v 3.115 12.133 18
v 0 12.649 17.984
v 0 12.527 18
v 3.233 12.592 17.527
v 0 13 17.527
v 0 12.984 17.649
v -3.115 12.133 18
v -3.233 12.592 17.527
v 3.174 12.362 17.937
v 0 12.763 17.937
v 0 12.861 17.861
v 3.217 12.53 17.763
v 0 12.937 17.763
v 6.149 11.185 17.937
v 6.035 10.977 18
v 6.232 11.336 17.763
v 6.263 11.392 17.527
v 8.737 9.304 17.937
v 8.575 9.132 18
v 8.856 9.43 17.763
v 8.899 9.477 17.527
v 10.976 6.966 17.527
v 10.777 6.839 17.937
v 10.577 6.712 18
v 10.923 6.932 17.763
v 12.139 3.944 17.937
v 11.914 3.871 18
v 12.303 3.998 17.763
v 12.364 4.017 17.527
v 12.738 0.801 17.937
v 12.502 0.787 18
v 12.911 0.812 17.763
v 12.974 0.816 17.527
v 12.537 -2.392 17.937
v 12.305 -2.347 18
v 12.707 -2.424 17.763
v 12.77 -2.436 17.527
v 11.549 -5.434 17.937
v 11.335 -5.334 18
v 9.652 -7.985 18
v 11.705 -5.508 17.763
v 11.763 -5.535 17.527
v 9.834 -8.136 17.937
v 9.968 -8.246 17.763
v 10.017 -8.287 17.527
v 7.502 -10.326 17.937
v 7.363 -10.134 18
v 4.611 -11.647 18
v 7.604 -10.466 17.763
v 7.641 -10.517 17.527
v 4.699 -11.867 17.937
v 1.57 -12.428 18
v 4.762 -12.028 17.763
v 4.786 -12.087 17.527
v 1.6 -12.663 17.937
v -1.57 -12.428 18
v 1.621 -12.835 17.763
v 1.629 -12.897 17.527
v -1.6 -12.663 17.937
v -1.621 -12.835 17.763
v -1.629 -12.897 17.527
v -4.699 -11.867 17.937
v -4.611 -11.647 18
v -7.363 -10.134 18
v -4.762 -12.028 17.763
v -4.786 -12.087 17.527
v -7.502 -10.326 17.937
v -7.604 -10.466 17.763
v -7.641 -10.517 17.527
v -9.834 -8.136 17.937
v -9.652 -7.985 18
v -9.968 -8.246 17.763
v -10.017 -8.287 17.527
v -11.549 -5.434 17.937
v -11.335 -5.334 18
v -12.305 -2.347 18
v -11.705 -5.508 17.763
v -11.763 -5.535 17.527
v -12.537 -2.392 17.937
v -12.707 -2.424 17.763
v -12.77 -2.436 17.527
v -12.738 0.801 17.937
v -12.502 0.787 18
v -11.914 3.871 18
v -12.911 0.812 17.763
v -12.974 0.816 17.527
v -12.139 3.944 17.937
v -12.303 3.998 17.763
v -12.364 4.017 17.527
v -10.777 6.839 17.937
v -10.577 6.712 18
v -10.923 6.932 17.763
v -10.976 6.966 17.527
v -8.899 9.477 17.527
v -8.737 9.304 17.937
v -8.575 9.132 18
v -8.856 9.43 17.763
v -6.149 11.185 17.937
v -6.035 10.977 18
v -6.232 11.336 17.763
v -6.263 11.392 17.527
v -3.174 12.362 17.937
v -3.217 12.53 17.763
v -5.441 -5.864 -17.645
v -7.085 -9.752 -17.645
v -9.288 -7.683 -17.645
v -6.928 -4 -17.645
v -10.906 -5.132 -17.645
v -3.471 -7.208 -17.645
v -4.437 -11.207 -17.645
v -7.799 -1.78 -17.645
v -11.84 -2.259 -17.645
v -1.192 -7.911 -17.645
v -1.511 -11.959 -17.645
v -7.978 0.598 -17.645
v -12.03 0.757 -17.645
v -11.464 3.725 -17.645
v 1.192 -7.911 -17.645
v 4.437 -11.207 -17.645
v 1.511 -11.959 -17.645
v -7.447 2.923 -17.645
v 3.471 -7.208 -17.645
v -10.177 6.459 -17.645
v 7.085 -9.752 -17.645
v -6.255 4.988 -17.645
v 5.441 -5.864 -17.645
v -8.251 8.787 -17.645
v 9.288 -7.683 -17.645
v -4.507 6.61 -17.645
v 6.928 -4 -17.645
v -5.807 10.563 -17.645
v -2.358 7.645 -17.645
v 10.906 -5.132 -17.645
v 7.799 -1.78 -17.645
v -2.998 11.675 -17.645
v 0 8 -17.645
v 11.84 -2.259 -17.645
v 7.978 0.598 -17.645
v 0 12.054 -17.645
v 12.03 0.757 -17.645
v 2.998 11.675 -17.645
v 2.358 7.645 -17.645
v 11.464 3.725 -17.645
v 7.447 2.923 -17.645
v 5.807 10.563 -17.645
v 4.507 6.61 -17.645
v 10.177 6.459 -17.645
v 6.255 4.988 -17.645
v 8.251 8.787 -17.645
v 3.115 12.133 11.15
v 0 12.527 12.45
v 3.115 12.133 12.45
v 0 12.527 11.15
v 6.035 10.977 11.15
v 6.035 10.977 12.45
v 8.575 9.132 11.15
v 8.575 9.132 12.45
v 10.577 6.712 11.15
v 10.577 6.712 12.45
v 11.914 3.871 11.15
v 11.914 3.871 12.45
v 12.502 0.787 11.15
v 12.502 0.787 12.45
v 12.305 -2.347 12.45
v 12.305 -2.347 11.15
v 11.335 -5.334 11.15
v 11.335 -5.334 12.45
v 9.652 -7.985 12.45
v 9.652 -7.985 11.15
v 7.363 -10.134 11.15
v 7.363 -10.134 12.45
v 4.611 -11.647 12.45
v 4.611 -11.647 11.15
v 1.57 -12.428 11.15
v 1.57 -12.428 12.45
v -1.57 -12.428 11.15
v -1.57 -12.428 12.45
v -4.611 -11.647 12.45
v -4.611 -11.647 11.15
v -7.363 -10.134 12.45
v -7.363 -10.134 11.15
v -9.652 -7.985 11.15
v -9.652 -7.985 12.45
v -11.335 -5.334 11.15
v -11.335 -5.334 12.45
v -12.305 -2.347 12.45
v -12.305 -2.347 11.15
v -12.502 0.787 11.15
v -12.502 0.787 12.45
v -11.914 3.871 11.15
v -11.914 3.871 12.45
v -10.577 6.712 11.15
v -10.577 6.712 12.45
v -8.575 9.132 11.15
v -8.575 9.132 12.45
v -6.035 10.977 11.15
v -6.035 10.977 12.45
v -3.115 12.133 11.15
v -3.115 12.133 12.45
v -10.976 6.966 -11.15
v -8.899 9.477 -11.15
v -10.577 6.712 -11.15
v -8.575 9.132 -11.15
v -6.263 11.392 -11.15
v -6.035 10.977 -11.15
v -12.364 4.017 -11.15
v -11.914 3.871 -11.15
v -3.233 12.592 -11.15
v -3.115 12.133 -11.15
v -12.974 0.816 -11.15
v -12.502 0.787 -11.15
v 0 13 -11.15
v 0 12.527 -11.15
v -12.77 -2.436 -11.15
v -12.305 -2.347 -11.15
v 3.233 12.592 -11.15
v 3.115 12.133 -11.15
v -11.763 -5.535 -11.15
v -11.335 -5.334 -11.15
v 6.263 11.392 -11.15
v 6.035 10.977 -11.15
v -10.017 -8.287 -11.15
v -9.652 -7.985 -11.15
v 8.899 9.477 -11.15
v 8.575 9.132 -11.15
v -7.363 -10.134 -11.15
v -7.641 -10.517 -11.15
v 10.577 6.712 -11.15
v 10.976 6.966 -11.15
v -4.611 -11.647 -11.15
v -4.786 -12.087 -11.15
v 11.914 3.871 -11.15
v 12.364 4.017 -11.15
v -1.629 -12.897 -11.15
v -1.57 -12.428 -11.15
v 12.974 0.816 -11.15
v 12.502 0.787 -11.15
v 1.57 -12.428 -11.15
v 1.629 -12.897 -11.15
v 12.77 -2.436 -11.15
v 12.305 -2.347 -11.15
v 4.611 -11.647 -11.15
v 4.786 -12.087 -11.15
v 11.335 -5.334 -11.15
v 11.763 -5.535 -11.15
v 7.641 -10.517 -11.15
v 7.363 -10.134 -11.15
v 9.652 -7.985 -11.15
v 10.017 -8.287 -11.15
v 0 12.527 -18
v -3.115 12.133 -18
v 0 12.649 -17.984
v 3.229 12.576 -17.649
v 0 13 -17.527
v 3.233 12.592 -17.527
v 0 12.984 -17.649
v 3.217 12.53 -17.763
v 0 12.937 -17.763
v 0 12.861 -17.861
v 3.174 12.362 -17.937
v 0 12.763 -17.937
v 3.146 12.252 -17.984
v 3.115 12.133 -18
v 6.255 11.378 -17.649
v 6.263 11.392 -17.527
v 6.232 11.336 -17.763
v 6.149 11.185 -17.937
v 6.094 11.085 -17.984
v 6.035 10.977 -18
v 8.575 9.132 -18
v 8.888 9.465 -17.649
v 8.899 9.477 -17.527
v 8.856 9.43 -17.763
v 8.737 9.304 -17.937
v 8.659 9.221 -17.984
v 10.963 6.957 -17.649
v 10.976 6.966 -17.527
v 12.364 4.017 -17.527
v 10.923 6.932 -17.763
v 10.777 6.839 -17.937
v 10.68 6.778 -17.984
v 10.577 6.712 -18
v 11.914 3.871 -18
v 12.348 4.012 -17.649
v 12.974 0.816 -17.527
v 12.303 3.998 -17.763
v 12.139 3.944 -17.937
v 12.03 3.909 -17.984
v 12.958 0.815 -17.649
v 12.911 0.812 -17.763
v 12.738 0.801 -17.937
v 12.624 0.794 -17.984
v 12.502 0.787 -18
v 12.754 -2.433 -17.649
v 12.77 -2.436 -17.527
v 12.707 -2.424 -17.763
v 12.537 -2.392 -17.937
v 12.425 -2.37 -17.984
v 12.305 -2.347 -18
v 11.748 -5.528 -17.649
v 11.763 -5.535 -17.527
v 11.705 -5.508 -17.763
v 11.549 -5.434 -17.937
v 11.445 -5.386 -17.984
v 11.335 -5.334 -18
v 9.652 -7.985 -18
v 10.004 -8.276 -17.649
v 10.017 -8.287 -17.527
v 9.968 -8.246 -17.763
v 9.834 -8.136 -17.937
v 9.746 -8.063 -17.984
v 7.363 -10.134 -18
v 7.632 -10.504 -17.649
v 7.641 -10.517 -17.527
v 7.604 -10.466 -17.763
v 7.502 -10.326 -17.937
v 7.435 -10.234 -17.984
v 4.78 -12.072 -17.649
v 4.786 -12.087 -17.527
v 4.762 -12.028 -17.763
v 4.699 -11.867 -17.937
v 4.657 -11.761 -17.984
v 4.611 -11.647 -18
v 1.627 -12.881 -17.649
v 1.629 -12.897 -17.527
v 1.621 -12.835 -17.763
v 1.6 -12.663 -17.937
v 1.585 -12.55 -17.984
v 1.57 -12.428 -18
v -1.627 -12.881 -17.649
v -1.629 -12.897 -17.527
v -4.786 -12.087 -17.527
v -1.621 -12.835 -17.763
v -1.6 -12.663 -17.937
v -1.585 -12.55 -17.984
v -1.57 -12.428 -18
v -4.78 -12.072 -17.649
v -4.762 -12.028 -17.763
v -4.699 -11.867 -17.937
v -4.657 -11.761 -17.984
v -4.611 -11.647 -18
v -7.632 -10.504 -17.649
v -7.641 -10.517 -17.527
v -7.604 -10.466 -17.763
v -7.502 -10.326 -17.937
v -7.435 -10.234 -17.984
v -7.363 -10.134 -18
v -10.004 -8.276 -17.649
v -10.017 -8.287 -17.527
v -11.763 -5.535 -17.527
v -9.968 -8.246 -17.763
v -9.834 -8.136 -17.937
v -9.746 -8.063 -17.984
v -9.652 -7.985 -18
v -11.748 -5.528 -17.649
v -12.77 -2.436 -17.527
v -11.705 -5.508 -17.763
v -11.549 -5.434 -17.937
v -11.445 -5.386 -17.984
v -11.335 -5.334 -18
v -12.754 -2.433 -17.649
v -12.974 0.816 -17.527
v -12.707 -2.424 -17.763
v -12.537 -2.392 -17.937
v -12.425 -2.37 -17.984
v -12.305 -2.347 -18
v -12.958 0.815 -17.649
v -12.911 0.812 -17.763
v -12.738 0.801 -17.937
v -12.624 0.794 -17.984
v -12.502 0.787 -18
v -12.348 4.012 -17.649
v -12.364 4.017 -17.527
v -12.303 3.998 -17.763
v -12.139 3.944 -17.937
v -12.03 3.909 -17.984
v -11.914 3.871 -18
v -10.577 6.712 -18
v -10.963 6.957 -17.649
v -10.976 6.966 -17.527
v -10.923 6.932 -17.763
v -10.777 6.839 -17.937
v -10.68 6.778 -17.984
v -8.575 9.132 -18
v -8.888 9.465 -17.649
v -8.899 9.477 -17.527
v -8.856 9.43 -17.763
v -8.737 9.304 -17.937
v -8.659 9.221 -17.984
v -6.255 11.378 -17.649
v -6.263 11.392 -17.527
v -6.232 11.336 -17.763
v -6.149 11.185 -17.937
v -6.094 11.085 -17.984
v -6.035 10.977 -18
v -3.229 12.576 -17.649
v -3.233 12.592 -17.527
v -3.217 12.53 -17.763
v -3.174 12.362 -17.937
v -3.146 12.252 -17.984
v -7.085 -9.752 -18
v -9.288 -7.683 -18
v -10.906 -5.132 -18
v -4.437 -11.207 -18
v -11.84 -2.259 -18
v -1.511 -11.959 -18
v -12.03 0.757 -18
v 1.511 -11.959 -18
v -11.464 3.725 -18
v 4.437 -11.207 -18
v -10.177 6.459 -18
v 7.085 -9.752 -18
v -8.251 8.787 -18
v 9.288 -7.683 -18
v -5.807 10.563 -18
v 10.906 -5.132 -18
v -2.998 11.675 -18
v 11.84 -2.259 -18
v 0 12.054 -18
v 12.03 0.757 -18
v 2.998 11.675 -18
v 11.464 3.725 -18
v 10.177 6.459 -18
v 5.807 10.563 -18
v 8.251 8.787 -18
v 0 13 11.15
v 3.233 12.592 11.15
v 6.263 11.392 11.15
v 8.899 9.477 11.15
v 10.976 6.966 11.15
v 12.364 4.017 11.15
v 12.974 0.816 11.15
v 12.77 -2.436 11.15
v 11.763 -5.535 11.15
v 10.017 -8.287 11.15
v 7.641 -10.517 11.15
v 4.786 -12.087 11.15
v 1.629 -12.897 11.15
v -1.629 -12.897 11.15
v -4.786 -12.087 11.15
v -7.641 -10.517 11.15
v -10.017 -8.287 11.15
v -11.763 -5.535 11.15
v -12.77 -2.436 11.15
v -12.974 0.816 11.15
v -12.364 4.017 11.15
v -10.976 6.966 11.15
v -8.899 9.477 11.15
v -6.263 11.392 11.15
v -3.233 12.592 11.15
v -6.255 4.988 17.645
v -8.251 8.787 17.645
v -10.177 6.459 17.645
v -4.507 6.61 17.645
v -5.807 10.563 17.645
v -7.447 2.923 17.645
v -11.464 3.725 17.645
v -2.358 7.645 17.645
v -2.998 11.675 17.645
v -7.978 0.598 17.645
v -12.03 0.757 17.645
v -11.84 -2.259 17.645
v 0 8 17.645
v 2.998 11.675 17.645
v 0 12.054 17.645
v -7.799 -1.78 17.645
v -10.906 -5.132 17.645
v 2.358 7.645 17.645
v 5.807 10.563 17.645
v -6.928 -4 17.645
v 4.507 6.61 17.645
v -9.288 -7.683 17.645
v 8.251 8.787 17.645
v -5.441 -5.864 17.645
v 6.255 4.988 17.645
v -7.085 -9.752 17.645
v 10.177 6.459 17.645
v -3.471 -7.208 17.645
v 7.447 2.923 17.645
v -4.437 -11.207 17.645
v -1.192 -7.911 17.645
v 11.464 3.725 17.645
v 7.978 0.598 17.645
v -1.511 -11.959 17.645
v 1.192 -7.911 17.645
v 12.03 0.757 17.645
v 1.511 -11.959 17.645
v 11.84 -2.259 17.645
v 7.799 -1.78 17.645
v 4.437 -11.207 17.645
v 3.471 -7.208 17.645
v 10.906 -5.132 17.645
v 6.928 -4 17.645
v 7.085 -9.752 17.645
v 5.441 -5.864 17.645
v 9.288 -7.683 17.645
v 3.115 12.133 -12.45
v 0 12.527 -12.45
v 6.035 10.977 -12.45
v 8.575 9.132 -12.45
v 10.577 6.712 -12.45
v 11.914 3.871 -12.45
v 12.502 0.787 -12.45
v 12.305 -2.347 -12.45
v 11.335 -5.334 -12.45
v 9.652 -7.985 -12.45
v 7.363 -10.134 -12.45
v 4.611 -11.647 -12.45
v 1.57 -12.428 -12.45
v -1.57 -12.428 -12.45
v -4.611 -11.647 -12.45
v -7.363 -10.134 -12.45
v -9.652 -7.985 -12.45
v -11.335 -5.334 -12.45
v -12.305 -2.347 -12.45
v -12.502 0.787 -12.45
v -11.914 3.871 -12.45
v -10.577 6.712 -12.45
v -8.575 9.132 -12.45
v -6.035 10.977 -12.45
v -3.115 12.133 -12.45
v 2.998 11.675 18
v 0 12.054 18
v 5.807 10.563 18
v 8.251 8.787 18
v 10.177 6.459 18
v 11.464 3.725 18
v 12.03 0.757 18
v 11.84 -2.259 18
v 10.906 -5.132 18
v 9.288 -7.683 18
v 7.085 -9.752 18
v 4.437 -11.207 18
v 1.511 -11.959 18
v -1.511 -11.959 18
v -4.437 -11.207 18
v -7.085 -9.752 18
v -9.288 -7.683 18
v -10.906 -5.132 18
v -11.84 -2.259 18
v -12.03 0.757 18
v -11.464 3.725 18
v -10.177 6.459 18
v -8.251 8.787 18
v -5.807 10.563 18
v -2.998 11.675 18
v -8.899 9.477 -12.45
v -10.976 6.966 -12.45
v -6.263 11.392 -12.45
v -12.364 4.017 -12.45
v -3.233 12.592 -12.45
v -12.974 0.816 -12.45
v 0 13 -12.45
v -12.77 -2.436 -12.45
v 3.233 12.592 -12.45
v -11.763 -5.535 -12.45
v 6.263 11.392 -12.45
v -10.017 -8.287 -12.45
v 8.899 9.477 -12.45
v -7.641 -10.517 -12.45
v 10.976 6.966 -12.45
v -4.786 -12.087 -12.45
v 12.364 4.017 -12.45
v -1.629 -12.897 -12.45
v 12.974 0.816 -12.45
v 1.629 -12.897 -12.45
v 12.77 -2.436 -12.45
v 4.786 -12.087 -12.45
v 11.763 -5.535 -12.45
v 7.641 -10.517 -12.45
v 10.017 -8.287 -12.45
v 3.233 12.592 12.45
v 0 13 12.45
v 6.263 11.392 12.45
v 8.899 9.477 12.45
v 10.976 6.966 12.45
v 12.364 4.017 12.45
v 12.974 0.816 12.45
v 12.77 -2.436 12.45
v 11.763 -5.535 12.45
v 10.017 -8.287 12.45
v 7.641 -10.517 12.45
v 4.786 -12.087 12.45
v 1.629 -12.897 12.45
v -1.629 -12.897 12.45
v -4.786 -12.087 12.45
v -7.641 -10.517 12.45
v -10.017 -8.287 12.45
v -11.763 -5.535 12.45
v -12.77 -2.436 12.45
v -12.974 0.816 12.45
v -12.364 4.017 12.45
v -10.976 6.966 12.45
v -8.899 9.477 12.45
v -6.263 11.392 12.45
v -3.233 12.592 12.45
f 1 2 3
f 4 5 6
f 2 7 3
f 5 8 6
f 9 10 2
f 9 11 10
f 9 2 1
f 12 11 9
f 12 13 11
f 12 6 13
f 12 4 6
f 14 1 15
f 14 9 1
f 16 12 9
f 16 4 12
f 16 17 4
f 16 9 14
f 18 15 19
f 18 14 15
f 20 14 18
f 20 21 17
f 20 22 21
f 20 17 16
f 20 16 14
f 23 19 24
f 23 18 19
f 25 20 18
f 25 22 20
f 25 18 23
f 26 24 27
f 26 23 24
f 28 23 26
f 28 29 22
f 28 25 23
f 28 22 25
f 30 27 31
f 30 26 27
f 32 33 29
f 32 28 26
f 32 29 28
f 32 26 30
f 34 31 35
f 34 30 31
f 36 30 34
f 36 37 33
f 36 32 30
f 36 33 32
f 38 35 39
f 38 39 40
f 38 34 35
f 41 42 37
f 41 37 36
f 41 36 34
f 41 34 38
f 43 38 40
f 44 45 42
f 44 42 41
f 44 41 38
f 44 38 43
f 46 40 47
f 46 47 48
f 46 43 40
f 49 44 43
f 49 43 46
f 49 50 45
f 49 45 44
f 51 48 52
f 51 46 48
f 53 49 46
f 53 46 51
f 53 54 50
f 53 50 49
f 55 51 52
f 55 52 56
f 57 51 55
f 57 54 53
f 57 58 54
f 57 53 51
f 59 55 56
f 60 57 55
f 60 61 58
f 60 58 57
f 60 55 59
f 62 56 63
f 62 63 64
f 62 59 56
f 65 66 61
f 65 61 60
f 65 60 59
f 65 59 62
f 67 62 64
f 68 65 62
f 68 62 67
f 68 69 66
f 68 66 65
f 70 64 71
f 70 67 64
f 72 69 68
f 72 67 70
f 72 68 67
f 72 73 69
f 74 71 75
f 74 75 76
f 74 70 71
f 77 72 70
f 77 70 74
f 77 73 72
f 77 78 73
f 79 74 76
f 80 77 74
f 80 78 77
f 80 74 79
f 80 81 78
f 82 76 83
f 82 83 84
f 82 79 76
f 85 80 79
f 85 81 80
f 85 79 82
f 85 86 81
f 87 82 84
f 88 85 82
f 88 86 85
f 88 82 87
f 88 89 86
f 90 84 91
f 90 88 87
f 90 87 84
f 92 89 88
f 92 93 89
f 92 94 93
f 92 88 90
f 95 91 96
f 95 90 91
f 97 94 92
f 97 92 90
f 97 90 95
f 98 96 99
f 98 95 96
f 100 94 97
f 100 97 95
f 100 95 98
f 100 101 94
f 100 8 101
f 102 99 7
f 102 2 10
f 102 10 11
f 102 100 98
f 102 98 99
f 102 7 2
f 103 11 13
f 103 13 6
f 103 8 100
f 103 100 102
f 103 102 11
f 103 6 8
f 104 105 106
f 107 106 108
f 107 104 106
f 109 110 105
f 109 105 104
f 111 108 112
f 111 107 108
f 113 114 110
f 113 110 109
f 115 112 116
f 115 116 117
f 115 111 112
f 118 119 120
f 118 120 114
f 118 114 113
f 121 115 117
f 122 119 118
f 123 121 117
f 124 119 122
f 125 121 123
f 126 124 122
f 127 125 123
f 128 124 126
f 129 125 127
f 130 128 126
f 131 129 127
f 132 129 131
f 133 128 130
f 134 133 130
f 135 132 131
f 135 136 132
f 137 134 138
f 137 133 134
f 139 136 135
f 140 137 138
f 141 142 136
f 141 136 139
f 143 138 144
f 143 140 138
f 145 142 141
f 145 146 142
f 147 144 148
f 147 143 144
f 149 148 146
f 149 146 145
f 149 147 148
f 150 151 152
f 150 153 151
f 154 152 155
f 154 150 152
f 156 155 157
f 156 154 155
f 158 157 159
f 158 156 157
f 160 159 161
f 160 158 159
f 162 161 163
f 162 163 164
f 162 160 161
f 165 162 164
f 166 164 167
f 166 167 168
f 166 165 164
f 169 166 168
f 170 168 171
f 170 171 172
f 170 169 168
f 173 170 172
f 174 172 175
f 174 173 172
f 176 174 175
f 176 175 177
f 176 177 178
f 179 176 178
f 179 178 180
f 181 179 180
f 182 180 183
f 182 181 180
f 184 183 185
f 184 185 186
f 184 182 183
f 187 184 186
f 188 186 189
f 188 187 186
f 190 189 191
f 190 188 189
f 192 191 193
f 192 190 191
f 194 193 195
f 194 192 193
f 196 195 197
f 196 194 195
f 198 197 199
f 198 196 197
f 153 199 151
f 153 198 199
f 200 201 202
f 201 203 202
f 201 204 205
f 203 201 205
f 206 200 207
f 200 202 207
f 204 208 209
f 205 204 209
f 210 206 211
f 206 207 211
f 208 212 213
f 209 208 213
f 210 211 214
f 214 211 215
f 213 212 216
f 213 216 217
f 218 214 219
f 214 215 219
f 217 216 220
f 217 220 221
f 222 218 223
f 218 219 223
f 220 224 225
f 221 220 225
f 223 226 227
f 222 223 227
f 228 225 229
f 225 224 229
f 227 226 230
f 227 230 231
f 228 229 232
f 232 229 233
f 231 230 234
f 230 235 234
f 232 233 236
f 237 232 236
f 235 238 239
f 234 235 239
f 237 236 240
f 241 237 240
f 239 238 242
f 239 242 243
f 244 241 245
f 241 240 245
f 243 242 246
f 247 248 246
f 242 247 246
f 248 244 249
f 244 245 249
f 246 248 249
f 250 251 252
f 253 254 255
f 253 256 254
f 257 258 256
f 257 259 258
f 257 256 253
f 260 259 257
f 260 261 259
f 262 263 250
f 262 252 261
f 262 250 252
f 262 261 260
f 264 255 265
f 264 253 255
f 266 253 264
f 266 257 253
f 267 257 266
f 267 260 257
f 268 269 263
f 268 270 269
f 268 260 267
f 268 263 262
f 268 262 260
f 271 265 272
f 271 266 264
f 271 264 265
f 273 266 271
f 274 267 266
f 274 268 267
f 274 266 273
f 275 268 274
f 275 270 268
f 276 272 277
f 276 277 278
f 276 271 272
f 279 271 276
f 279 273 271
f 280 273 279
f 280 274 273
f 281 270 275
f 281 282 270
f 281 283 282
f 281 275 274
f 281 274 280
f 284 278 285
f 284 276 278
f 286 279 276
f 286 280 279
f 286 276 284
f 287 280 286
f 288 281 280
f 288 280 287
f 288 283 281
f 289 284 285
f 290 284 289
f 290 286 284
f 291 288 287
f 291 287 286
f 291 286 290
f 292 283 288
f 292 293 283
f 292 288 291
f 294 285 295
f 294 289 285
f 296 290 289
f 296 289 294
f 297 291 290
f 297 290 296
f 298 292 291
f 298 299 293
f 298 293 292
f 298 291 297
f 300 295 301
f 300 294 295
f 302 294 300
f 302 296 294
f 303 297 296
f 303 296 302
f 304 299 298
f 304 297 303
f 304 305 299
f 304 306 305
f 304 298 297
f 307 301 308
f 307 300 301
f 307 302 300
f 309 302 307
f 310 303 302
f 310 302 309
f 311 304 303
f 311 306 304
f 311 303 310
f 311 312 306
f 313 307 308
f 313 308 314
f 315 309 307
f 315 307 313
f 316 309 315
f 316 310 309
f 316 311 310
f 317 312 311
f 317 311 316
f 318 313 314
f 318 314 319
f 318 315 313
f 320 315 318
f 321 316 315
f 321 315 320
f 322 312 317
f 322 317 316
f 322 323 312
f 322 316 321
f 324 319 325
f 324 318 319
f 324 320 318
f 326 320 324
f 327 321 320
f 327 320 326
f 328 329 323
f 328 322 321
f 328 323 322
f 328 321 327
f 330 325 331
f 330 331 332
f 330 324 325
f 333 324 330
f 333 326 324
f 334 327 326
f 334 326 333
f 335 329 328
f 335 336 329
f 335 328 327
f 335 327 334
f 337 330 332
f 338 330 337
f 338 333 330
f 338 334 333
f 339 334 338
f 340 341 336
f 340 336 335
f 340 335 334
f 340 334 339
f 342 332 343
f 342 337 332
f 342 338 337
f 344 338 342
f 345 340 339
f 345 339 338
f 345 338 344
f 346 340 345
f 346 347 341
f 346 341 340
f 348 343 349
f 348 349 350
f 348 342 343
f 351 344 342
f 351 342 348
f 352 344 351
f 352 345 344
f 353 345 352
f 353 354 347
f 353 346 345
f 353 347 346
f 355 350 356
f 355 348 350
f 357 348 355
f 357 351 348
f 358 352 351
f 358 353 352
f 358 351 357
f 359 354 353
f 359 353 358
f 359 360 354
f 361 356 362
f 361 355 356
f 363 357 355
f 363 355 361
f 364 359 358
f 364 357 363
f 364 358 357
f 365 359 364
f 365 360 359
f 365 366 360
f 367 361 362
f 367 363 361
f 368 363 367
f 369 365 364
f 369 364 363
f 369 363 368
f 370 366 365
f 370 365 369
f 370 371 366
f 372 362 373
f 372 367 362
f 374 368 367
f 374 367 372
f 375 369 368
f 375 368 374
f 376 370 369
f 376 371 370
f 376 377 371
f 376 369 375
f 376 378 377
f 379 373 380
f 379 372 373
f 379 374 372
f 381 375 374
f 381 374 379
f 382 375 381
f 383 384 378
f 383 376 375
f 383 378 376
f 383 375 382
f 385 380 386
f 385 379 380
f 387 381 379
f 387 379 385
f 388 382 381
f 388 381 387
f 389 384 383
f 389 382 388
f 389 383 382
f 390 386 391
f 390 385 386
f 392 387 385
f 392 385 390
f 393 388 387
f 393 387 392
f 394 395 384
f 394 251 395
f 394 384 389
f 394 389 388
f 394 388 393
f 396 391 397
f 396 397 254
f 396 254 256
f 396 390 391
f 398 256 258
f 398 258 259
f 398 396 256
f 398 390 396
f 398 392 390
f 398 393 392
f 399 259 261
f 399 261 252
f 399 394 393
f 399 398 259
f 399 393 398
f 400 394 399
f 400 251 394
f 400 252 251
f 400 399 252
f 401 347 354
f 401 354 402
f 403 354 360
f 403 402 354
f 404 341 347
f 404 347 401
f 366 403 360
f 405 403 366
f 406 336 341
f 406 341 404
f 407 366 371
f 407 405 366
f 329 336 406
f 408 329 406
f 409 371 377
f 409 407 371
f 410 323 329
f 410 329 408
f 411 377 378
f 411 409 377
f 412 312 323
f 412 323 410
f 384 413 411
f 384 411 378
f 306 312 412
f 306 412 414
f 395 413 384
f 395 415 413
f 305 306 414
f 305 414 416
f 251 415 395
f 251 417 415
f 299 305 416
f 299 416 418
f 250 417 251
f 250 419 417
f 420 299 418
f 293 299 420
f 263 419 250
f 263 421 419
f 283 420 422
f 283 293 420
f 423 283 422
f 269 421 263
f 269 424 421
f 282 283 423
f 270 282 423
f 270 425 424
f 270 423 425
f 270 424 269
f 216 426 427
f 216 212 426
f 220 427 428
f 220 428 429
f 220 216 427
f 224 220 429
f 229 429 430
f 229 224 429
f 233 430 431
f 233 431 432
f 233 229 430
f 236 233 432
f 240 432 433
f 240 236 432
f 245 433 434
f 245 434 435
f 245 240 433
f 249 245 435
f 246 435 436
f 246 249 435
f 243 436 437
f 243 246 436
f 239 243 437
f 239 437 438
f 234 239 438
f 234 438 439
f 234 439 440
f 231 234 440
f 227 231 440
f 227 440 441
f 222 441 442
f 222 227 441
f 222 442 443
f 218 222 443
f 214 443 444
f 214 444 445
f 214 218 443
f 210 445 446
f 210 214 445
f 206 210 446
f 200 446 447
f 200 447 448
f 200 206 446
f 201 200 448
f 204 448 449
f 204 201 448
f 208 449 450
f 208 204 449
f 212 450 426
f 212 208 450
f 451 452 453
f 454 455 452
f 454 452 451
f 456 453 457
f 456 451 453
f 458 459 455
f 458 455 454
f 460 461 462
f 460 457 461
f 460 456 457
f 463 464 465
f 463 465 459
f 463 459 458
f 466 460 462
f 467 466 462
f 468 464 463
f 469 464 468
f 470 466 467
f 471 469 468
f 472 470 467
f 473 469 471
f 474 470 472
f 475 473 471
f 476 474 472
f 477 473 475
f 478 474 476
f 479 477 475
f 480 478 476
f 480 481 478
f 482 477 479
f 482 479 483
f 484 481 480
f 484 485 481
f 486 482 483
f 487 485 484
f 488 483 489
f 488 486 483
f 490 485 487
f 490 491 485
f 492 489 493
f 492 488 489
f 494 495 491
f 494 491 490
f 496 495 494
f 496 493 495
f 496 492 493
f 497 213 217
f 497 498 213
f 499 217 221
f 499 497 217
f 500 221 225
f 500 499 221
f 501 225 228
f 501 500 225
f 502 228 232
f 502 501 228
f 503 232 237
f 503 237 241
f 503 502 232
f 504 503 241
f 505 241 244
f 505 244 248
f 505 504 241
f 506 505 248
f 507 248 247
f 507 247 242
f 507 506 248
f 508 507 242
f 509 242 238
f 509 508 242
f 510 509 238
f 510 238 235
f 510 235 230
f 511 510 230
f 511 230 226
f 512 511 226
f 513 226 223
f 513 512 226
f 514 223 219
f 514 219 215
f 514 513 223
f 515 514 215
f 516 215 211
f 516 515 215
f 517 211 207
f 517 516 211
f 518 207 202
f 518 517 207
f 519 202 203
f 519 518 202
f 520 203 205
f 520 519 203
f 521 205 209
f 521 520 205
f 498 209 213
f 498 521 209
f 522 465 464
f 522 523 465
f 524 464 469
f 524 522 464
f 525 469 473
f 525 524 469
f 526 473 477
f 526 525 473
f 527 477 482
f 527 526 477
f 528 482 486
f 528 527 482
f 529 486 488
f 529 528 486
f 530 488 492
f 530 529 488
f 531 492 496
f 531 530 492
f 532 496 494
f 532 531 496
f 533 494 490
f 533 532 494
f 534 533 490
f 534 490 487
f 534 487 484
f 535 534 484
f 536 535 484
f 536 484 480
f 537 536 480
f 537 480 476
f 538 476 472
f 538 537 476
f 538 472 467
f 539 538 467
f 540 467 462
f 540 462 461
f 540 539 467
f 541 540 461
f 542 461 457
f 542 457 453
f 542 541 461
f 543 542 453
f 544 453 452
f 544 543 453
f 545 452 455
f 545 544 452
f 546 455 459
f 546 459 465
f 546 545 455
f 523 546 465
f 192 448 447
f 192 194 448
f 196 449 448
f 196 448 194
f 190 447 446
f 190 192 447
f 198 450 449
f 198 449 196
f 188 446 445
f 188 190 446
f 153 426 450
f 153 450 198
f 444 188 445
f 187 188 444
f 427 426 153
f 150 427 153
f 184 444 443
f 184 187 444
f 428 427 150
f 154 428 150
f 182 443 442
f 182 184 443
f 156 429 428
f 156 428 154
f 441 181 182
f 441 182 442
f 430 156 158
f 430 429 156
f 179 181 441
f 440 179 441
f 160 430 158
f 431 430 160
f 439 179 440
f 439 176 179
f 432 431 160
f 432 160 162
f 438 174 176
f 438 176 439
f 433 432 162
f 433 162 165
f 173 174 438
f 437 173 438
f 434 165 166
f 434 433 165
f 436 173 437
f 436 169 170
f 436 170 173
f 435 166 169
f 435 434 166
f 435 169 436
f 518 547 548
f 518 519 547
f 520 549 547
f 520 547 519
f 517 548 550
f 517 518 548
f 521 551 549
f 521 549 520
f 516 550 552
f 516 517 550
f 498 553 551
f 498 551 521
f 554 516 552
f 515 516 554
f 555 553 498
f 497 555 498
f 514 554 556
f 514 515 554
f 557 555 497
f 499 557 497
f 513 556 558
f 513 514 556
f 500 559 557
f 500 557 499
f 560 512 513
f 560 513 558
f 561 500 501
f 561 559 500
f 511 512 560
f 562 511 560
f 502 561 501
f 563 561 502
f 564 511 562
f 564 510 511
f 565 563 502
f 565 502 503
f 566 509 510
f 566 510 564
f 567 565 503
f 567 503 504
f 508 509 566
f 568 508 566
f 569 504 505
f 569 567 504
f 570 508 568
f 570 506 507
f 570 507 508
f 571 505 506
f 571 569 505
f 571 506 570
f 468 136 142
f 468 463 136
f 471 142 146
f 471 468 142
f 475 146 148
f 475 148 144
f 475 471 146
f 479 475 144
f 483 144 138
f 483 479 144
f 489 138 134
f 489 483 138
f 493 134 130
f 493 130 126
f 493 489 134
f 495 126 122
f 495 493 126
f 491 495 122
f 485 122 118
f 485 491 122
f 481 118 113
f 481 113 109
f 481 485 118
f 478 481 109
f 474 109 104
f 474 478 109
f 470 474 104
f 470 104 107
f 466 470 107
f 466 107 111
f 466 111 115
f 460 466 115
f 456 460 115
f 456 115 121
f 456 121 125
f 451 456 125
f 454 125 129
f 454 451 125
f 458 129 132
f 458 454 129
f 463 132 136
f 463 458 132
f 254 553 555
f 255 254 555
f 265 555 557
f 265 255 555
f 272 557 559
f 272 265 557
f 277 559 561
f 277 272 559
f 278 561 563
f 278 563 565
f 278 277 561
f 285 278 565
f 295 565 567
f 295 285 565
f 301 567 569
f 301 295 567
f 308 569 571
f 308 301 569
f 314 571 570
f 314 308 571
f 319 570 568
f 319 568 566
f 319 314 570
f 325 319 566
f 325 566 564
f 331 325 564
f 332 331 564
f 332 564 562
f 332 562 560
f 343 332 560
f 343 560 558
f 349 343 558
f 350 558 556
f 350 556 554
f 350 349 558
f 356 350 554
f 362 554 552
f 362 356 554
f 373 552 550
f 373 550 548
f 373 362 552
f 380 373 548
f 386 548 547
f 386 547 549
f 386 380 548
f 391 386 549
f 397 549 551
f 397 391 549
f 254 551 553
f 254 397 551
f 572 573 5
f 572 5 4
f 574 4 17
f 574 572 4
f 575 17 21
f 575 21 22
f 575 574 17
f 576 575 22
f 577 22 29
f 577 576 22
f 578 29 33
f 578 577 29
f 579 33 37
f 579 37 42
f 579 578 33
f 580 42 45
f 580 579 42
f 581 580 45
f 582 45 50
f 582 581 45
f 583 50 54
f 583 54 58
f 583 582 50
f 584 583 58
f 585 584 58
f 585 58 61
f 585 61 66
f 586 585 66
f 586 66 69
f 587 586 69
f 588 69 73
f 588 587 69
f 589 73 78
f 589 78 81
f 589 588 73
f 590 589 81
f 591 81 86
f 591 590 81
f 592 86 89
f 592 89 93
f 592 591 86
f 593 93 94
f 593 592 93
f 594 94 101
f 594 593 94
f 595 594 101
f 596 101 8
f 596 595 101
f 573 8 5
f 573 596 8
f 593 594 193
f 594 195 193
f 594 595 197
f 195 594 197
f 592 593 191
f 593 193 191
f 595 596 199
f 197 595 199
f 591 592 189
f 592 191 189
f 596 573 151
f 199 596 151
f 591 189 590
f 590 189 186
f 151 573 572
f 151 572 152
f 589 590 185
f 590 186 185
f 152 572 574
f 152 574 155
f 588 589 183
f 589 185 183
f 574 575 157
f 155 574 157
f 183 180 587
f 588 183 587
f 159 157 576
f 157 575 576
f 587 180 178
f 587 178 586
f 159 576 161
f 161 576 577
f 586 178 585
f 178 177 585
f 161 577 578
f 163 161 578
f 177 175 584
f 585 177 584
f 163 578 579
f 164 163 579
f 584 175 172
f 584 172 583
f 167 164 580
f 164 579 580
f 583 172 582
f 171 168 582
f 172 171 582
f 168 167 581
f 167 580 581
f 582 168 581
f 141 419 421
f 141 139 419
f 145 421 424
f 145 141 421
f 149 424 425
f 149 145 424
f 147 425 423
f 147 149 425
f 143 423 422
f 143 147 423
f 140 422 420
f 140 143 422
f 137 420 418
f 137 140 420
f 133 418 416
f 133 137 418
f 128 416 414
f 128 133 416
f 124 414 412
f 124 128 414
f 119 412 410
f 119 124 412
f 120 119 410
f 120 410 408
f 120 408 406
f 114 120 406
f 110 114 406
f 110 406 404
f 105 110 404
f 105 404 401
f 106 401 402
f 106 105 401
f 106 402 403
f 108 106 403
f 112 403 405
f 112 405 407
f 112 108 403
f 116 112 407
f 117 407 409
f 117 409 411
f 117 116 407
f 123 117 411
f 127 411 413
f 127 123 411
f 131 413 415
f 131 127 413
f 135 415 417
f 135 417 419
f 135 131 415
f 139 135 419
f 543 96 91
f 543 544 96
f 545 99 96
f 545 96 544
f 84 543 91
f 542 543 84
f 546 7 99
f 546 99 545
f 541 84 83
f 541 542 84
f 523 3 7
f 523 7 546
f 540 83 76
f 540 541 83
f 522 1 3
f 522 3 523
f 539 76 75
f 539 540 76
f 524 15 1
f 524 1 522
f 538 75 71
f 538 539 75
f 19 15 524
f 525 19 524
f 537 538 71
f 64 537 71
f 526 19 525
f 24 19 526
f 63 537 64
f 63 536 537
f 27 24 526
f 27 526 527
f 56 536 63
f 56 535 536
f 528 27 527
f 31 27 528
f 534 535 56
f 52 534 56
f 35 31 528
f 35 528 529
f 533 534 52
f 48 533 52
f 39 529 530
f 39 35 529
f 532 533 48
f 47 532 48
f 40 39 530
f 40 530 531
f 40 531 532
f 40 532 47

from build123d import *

# Parameters (mm, degrees)
SKETCH3_W = 1.3
SKETCH3_H = 0.473161305


with BuildPart() as part:
    # Sketch2 → Body (revolve)
    with BuildSketch(Plane(origin=(0, 0, 0), x_dir=(0, 0, -1), z_dir=(1, 0, 0))):
        with BuildLine():
            Line((-17.645349183, 12.053677391), (-18, 12.053677391))
            Line((-18, 12.053677391), (-18, 12.526838695))
            ThreePointArc((-18, 12.526838695), (-17.861414262, 12.861414262), (-17.526838695, 13))
            Line((-17.526838695, 13), (17.526838695, 13))
            ThreePointArc((17.526838695, 13), (17.861414262, 12.861414262), (18, 12.526838695))
            Line((18, 12.526838695), (18, 12.053677391))
            Line((18, 12.053677391), (17.645349183, 12.053677391))
            Line((17.645349183, 12.053677391), (17.645349183, 8))
            Line((17.645349183, 8), (-17.645349183, 8))
            Line((-17.645349183, 8), (-17.645349183, 12.053677391))
        make_face()
    revolve(axis=Axis((0, 0, 18), (0, 0, -1)))

    # Sketch3 → Track (revolve, cut)
    with BuildSketch(Plane(origin=(0, 0, 0), x_dir=(0, 0, -1), z_dir=(1, 0, 0))):
        with Locations((11.8, 12.763419348)):
            Rectangle(SKETCH3_W, SKETCH3_H)
        with Locations((-11.8, 12.763419348)):
            Rectangle(SKETCH3_W, SKETCH3_H)
    revolve(axis=Axis((0, 0, 18), (0, 0, -1)), mode=Mode.SUBTRACT)


solid = part.part
